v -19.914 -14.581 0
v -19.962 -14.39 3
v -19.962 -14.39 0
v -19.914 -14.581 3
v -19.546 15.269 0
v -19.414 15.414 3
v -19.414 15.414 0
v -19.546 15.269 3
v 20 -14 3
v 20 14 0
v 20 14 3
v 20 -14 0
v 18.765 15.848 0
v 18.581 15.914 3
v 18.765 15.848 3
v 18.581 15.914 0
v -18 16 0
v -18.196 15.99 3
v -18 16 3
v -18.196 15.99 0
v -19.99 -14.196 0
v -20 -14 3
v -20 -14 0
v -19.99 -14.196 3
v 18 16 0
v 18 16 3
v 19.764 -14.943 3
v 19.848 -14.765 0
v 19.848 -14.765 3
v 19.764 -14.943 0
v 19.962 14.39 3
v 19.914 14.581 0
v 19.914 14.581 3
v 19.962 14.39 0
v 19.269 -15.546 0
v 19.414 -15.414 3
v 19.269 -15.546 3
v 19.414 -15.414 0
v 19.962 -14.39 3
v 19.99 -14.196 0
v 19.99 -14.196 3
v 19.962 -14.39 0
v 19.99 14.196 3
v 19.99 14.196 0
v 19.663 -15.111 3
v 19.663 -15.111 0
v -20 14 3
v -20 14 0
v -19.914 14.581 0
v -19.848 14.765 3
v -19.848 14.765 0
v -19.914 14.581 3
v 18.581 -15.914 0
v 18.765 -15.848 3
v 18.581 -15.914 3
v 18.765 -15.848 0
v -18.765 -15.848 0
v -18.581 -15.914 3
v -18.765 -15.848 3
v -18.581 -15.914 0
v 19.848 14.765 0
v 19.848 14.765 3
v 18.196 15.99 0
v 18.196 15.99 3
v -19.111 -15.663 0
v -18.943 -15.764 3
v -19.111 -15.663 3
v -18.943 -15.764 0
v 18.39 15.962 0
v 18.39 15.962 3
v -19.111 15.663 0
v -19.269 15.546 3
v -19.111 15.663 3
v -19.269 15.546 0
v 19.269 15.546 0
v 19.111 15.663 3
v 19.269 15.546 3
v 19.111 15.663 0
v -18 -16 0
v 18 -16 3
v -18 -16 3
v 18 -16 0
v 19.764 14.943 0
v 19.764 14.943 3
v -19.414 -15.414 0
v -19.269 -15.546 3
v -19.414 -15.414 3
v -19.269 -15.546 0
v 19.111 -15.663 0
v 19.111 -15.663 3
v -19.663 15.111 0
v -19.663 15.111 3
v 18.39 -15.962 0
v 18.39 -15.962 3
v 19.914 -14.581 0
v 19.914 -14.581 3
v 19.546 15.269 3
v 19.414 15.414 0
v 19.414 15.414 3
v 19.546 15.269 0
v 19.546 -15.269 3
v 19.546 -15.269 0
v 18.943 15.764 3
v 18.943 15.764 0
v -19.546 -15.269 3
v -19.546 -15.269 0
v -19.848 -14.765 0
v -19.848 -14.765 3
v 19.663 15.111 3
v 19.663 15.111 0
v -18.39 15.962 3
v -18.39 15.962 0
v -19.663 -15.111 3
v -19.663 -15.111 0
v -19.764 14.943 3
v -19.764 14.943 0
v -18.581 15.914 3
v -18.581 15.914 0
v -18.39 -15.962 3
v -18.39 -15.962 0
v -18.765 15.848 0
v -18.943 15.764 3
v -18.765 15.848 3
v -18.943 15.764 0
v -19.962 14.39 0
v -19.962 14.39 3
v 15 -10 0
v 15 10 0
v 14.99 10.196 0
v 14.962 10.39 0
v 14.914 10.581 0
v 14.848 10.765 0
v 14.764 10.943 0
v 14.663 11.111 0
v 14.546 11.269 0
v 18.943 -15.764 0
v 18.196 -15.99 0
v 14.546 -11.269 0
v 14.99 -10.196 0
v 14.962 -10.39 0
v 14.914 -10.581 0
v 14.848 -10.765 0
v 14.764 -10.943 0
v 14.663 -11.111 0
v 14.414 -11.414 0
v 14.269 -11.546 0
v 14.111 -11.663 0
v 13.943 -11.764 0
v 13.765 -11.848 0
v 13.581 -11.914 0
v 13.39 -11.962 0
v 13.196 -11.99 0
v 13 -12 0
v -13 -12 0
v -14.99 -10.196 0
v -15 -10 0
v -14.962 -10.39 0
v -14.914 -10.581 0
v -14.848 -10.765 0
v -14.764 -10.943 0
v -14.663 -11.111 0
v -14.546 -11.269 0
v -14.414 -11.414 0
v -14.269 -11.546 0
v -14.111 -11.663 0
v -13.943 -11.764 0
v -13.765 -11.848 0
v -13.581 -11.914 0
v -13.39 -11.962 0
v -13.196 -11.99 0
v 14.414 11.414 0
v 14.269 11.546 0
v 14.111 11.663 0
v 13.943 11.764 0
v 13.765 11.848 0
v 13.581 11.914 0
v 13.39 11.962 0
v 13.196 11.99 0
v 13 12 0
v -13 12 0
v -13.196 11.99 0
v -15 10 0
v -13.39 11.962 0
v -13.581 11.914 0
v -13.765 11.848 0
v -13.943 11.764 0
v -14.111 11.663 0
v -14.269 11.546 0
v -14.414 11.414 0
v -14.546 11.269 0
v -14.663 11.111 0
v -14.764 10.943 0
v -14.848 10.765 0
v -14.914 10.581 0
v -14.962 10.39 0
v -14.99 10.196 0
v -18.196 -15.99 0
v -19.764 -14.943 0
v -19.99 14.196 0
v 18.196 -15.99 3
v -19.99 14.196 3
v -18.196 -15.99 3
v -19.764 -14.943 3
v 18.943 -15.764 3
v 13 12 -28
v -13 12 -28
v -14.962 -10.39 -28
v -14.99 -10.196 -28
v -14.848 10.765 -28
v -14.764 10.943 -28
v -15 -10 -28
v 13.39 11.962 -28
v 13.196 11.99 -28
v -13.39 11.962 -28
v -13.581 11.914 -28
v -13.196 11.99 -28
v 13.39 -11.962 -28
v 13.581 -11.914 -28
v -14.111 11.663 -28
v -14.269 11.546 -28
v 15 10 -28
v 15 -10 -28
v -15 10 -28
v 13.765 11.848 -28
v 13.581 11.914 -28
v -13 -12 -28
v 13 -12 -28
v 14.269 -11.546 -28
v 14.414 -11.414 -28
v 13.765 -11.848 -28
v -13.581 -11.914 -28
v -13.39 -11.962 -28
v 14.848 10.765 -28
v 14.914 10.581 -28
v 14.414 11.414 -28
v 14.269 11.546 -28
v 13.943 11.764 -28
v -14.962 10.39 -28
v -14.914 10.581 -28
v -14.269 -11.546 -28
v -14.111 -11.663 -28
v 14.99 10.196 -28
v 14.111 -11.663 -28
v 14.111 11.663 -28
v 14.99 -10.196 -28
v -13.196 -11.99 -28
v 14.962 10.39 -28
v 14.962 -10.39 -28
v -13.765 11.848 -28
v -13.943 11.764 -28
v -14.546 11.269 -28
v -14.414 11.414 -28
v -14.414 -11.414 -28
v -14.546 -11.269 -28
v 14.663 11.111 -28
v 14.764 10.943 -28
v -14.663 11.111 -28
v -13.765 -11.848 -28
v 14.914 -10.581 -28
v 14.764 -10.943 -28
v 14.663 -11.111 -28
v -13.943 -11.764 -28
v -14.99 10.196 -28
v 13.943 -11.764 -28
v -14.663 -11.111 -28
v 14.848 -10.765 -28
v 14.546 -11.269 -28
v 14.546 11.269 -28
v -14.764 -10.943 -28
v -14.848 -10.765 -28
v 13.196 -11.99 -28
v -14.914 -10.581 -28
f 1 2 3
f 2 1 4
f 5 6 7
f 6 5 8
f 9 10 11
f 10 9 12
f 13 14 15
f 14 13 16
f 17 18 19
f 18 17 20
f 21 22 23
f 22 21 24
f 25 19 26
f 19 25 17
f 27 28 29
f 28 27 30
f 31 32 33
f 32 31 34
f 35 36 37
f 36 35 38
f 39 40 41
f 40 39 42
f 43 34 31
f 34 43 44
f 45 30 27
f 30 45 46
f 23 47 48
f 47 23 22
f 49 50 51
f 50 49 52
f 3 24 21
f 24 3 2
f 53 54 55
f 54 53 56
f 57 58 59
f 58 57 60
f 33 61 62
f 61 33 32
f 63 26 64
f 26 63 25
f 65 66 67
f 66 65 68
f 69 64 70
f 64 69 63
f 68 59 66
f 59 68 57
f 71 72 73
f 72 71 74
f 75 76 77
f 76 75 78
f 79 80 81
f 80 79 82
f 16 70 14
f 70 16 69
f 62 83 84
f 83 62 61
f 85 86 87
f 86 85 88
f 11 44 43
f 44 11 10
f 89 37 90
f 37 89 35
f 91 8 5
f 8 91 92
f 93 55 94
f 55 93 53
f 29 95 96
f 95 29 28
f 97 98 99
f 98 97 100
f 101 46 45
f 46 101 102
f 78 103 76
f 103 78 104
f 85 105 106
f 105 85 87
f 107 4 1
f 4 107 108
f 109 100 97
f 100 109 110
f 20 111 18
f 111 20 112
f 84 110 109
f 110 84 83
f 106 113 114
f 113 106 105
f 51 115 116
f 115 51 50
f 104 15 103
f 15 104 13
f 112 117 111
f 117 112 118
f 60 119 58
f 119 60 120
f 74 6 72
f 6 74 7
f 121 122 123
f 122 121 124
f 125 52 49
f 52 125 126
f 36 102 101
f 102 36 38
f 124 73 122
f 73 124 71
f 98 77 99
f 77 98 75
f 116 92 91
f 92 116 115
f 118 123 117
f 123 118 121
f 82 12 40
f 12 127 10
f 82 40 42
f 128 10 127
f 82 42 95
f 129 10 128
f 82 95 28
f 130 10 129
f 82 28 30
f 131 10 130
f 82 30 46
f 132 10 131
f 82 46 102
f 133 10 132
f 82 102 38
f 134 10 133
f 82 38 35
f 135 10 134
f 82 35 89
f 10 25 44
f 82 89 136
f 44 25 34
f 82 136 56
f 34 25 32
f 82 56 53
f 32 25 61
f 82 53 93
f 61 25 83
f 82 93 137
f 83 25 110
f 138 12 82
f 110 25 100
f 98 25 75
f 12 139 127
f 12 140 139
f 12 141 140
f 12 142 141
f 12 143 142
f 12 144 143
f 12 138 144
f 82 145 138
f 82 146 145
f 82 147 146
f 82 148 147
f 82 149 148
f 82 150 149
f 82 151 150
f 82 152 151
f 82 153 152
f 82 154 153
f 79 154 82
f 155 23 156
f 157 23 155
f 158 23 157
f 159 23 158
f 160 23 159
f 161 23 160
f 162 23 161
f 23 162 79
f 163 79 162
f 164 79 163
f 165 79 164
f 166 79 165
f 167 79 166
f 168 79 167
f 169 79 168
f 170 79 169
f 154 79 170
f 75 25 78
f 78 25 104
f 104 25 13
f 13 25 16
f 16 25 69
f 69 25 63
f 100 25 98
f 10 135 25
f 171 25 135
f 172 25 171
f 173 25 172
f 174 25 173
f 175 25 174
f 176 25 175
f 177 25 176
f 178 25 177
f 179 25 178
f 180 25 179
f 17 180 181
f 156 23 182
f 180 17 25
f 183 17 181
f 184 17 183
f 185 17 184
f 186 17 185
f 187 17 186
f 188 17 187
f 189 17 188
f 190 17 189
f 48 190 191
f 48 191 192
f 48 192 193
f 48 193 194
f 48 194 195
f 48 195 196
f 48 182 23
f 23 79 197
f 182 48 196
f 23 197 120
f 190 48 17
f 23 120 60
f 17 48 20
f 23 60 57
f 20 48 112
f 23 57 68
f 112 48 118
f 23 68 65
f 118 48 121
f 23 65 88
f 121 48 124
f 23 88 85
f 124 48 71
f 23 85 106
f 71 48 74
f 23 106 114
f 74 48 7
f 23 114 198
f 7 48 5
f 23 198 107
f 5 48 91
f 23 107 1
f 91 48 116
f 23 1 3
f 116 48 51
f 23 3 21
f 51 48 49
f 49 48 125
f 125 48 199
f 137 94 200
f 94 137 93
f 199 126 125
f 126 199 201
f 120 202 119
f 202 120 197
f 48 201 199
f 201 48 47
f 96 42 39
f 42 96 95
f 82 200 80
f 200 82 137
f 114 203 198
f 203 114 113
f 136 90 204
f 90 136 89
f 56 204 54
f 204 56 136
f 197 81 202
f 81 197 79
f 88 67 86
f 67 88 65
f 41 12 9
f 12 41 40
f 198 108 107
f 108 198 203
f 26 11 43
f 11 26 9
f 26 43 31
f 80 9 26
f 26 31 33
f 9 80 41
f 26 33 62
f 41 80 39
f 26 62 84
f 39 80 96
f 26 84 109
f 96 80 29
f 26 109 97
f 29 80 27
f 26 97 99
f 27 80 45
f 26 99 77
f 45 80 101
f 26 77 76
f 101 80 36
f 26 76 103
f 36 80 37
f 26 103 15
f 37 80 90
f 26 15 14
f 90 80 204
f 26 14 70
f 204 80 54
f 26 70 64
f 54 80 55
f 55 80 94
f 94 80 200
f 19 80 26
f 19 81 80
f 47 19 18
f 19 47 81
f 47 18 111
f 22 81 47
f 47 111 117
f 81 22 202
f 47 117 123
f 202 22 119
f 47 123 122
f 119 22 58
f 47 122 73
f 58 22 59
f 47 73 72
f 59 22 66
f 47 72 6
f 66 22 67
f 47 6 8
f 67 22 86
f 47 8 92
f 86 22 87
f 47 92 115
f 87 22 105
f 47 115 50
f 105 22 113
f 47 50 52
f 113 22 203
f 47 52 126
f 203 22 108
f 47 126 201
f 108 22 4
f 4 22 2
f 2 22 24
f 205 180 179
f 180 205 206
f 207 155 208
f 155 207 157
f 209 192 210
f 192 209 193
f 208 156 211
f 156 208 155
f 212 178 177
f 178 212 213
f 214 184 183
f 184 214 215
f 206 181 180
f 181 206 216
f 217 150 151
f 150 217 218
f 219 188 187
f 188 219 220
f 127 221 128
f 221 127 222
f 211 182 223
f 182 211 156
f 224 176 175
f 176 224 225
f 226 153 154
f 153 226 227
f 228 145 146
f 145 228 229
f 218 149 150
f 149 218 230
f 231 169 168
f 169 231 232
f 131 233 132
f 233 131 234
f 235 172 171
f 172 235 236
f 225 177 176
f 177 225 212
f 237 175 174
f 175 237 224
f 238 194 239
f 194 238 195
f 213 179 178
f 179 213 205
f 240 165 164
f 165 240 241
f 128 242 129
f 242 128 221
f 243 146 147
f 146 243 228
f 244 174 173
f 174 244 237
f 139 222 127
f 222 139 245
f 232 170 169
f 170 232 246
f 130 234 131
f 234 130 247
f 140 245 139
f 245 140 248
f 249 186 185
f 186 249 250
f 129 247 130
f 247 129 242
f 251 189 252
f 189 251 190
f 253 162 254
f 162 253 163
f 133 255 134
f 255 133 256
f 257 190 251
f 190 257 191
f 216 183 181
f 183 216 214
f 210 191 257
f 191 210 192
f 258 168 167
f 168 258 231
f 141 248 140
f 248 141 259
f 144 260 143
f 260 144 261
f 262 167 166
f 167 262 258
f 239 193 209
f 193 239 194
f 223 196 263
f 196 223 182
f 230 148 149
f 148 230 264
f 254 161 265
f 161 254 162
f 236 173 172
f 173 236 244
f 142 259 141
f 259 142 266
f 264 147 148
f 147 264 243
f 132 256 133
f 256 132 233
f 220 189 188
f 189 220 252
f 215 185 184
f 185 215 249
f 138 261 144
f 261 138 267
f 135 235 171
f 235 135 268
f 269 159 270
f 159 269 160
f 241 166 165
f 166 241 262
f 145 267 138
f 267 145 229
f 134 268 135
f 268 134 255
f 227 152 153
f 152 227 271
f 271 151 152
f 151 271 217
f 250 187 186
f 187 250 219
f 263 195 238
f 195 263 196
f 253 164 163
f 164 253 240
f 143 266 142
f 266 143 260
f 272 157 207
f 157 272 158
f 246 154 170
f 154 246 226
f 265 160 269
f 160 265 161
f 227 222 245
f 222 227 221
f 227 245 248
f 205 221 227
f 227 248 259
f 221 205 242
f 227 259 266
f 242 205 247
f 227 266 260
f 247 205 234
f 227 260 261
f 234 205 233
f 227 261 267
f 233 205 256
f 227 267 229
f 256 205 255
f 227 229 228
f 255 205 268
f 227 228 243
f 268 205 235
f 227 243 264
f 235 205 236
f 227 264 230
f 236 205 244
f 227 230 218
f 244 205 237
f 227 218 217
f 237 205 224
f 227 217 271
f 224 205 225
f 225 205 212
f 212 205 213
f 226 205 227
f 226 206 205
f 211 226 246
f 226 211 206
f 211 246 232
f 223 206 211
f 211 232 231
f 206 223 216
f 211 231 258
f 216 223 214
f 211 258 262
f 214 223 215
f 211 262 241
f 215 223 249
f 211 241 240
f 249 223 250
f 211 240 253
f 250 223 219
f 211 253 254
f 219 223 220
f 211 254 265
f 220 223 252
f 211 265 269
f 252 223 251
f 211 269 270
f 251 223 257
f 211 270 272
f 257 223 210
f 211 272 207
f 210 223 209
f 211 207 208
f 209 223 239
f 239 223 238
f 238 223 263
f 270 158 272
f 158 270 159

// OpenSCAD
$fn=64;

module rounded_rect_2d(w, h, r){
    r2 = min(r, min(w,h)/2);
    hull(){
        translate([ w/2 - r2,  h/2 - r2]) circle(r=r2);
        translate([-w/2 + r2,  h/2 - r2]) circle(r=r2);
        translate([-w/2 + r2, -h/2 + r2]) circle(r=r2);
        translate([ w/2 - r2, -h/2 + r2]) circle(r=r2);
    }
}

module slot_2d(len, wid){
    hull(){
        translate([ len/2 - wid/2, 0]) circle(d=wid);
        translate([-len/2 + wid/2, 0]) circle(d=wid);
    }
}

module iec_inlet_cutout_2d(){
    // Panel cutout for IEC C14 style inlet (approximate)
    // Outer flange size: 40 x 32 (given)
    // Typical panel cutout: 27.5 x 20.0 with corner radius ~2
    rounded_rect_2d(27.5, 20.0, 2.0);
}

module iec_inlet_flange_3d(th=3.0){
    linear_extrude(height=th)
        rounded_rect_2d(40.0, 32.0, 2.0);
}

module iec_inlet_body_3d(depth=28.0){
    // Body behind panel (approximate)
    translate([0,0,-depth])
        linear_extrude(height=depth)
            rounded_rect_2d(30.0, 24.0, 2.0);
}

module iec_inlet_mount_holes_2d(){
    // Two mounting holes (approximate) centered vertically, spaced horizontally
    hole_d = 3.2;
    spacing = 30.0;
    translate([ spacing/2, 0]) circle(d=hole_d);
    translate([-spacing/2, 0]) circle(d=hole_d);
}

module iec_inlet_module(){
    union(){
        // Flange at panel plane (z=0..th)
        iec_inlet_flange_3d(3.0);
        // Body behind panel (negative z)
        iec_inlet_body_3d(28.0);
    }
}

module iec_inlet_negative(panel_th=3.0, extra=0.5){
    // Negative volume to cut into a panel: cutout + mounting holes
    union(){
        translate([0,0,-extra])
            linear_extrude(height=panel_th + 2*extra)
                iec_inlet_cutout_2d();
        translate([0,0,-extra])
            linear_extrude(height=panel_th + 2*extra)
                iec_inlet_mount_holes_2d();
    }
}

// Render the inlet module centered at origin, with panel plane at z=0
iec_inlet_module();
